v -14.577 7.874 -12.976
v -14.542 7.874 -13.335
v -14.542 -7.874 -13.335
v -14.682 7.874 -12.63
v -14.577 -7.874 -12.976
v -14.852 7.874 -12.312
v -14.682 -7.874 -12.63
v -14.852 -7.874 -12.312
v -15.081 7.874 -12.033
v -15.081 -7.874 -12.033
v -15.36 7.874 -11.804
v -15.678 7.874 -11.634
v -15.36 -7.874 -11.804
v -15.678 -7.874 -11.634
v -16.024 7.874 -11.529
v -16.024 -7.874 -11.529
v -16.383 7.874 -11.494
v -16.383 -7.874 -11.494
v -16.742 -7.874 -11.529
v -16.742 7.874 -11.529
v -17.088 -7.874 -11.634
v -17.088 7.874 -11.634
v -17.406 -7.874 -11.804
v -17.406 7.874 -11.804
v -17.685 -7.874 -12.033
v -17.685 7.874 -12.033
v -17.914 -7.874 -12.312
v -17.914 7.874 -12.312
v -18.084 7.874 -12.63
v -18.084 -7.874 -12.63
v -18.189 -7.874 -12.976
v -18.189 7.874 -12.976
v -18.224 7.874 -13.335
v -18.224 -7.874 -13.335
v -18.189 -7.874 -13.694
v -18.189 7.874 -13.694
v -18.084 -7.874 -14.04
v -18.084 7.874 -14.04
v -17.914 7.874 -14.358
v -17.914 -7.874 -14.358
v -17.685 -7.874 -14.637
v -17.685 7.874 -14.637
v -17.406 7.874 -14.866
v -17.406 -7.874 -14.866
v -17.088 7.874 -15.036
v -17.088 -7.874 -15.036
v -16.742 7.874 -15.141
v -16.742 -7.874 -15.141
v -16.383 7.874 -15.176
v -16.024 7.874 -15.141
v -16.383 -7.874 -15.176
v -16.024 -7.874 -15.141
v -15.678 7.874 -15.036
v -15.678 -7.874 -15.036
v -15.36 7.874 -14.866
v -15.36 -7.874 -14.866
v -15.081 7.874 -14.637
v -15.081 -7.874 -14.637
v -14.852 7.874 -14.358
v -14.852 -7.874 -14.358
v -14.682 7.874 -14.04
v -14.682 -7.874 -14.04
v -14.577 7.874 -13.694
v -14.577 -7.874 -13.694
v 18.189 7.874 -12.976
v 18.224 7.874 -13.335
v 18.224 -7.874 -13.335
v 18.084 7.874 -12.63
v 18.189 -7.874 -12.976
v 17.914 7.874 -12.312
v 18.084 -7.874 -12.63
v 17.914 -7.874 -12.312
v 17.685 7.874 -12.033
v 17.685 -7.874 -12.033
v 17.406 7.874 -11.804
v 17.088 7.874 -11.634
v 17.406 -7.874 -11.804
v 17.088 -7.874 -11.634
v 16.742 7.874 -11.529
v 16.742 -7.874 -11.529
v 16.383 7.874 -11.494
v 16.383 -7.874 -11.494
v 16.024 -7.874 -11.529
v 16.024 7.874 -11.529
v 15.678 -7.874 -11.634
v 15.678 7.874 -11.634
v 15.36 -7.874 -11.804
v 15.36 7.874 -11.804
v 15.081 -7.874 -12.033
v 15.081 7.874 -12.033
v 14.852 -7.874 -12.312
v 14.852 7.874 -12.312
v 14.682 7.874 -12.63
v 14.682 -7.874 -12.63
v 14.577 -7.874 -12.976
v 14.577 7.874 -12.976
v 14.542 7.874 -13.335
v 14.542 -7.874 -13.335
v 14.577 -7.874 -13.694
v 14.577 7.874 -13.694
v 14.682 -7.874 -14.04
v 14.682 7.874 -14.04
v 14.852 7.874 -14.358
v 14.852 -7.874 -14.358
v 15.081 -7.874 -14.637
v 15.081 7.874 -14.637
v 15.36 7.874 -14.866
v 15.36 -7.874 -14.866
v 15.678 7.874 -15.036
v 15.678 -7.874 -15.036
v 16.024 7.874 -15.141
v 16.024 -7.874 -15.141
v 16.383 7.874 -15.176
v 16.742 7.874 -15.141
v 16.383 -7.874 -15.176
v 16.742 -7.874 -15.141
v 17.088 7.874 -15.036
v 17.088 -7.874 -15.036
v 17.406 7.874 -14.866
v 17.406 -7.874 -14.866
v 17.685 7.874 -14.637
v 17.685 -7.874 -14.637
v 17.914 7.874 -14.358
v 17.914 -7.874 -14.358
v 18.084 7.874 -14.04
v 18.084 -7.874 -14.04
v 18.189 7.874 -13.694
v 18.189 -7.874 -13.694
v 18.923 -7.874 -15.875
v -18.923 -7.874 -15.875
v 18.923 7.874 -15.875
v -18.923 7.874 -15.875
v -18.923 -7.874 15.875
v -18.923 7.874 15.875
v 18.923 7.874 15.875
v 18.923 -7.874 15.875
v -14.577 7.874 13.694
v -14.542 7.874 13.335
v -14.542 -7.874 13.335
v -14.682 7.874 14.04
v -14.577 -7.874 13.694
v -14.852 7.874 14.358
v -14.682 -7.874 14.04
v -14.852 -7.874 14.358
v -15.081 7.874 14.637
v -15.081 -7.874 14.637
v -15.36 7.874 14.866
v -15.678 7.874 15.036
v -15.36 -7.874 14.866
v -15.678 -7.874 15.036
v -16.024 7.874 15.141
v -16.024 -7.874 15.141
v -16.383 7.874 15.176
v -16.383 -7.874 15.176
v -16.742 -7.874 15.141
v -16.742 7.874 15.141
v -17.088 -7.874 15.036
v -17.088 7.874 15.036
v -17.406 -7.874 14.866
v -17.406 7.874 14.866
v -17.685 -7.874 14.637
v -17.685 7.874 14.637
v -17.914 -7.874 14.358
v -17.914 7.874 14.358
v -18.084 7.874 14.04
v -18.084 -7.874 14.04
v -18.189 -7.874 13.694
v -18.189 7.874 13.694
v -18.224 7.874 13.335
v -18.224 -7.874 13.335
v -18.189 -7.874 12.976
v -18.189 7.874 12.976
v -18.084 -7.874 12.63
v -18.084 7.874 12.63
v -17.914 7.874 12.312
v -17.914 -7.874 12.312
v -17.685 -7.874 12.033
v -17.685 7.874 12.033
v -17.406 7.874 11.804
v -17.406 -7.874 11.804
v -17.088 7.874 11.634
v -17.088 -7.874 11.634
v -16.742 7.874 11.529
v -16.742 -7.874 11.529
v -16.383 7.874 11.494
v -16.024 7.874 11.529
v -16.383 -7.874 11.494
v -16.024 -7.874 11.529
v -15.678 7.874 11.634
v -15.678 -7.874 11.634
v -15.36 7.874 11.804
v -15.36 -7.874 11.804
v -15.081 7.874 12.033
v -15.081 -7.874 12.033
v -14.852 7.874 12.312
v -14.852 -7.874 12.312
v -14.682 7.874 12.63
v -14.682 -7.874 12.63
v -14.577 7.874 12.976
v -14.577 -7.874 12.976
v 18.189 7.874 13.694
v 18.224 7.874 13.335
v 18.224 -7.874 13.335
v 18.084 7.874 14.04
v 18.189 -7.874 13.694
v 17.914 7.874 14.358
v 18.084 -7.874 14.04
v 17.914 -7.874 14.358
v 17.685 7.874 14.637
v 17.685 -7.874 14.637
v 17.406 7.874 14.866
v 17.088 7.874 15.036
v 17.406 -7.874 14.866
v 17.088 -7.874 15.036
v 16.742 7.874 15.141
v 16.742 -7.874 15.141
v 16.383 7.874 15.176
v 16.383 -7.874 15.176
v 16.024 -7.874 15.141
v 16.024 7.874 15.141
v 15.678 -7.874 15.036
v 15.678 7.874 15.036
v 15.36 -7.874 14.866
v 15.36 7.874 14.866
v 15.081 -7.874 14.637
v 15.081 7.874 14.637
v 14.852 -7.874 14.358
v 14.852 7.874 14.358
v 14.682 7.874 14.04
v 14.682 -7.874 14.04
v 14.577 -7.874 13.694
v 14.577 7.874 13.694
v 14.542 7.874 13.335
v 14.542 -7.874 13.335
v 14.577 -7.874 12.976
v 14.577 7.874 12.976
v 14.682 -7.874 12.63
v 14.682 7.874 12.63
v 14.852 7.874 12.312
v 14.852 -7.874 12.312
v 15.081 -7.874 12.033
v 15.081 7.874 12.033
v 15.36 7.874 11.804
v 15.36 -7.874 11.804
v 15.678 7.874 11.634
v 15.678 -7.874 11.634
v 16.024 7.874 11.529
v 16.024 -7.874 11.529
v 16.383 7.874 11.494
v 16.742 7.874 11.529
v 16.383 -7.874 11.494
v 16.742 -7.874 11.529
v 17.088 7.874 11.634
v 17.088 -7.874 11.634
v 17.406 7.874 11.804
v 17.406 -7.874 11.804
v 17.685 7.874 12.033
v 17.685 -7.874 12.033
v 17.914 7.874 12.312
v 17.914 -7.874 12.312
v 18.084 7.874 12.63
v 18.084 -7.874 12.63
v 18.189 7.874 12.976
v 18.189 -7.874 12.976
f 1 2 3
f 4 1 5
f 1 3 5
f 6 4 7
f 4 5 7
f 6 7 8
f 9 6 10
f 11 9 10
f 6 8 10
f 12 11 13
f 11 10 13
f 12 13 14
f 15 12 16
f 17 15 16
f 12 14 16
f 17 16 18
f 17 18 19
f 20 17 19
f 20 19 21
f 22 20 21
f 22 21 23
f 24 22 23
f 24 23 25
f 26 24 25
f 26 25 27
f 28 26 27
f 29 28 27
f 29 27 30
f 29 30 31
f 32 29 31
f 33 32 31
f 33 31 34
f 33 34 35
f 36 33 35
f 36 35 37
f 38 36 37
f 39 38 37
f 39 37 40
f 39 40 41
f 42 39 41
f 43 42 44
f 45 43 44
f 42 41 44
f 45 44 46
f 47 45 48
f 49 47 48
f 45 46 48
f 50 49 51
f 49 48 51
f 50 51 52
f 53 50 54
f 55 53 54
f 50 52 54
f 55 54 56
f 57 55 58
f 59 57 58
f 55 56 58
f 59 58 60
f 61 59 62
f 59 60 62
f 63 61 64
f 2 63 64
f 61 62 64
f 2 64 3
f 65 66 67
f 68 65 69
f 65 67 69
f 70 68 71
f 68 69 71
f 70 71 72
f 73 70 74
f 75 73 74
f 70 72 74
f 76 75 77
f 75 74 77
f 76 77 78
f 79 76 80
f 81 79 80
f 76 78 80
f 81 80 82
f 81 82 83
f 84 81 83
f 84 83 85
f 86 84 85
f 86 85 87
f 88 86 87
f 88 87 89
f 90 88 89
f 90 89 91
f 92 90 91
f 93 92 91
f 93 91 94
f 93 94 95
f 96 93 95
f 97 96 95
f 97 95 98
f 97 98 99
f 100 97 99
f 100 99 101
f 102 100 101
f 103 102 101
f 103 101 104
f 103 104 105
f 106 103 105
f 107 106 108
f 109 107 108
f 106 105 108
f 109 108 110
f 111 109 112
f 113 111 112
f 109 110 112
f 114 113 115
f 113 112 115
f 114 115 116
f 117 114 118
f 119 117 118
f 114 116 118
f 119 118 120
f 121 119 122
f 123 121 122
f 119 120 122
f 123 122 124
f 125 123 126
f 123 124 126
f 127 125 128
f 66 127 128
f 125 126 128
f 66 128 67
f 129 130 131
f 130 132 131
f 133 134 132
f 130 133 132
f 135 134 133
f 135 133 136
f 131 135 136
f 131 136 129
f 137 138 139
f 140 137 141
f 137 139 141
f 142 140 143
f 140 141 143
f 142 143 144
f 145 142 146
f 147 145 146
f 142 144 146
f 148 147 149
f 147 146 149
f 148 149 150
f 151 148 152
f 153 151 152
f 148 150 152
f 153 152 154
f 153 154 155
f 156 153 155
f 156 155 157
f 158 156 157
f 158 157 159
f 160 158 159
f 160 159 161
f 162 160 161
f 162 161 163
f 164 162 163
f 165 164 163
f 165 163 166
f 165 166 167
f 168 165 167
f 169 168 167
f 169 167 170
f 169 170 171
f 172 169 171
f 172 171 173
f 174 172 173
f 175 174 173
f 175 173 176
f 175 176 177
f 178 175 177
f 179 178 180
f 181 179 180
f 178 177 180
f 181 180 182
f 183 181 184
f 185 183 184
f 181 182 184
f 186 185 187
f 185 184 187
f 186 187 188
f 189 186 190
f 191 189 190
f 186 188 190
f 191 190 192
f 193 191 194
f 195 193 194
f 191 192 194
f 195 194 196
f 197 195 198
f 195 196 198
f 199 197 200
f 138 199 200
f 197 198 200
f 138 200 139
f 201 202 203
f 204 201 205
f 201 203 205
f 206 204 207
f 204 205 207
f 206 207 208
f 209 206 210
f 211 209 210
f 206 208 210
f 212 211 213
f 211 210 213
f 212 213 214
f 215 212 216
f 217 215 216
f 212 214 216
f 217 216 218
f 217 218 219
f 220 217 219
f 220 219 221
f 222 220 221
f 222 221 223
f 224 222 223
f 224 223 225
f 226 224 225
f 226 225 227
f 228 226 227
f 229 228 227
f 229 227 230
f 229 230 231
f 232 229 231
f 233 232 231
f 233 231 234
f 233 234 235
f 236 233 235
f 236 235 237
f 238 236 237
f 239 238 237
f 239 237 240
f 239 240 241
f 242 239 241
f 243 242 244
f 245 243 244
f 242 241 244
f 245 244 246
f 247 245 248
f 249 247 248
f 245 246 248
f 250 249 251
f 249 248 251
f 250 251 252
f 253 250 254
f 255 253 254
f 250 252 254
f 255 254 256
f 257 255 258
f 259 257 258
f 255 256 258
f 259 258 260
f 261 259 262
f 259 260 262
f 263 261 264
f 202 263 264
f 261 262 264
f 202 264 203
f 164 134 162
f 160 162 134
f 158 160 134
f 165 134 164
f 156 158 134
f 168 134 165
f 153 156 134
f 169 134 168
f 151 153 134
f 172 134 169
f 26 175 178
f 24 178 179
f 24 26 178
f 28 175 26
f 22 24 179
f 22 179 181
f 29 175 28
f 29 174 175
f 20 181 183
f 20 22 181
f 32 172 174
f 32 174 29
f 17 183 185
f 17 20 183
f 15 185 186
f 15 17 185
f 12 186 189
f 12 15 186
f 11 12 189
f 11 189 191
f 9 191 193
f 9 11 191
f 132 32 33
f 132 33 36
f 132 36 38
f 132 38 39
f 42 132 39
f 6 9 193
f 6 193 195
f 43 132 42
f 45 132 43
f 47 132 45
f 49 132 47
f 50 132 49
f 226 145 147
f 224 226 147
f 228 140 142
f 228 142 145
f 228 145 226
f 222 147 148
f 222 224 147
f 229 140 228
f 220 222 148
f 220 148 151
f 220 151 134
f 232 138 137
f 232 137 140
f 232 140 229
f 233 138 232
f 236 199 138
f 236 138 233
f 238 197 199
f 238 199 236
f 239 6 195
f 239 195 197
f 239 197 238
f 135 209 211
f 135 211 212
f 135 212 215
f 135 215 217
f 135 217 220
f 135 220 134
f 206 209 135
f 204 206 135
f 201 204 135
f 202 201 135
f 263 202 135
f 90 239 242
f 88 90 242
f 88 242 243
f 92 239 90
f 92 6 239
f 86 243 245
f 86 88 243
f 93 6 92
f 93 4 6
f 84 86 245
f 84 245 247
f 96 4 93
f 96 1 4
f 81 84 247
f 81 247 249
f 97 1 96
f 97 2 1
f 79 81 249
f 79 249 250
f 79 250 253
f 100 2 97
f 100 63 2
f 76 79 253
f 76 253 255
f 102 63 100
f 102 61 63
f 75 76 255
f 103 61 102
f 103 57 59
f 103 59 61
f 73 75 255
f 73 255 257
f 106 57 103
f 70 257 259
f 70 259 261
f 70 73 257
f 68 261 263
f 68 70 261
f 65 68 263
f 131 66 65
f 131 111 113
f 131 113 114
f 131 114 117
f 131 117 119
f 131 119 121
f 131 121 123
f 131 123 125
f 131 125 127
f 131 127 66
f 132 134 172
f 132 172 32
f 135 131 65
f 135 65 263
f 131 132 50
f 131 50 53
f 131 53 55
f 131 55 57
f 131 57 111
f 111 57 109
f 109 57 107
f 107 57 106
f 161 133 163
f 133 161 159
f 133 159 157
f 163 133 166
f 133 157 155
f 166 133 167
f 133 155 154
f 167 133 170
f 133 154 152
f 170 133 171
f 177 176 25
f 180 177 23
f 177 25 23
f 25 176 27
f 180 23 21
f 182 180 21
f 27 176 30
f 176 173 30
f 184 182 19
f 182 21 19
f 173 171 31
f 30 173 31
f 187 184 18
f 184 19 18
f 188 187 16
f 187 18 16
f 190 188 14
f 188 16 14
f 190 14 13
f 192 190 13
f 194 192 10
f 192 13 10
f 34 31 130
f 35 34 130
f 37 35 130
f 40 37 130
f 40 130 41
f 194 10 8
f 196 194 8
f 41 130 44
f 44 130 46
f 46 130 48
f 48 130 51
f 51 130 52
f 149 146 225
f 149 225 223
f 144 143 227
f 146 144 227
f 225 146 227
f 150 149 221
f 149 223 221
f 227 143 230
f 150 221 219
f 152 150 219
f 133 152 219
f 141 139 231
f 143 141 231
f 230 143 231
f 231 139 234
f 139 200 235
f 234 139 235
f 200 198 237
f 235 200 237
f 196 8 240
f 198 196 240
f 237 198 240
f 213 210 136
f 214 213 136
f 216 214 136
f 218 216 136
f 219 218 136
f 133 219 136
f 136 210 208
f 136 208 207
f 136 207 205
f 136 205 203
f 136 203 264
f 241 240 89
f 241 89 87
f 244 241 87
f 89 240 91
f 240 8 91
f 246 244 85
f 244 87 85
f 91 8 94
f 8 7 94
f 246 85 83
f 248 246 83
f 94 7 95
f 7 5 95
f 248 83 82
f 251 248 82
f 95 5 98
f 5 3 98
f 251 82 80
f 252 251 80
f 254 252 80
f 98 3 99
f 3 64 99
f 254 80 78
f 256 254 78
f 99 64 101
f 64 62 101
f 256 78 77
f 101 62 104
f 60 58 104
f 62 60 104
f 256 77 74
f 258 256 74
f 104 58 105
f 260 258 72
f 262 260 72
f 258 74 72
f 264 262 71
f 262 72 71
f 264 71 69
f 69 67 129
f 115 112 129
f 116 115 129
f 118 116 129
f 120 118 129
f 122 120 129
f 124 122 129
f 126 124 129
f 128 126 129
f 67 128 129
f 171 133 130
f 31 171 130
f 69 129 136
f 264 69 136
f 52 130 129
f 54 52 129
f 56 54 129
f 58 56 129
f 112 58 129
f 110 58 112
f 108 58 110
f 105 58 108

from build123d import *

# Parameters (mm, degrees)
SKETCH1_W           = 37.846
SKETCH1_H           = 31.75
BOSS_EXTRUDE1_DEPTH = 7.874
SKETCH2_R           = 1.8415
CUT_EXTRUDE1_DEPTH  = 16.748


with BuildPart() as part:
    # Sketch1 → Boss-Extrude1 (new body, symmetric)
    with BuildSketch(Plane(origin=(0, 0, 0), x_dir=(1, 0, 0), z_dir=(0, 1, 0))):
        Rectangle(SKETCH1_W, SKETCH1_H)
    extrude(amount=BOSS_EXTRUDE1_DEPTH, both=True)

    # Sketch2 → Cut-Extrude1 (cut, through all)
    with BuildSketch(Plane.XZ.offset(7.874)):
        with Locations((-16.383, 13.335)):
            Circle(SKETCH2_R)
        with Locations((16.383, 13.335)):
            Circle(SKETCH2_R)
        with Locations((16.383, -13.335)):
            Circle(SKETCH2_R)
        with Locations((-16.383, -13.335)):
            Circle(SKETCH2_R)
    extrude(amount=-CUT_EXTRUDE1_DEPTH, mode=Mode.SUBTRACT)


solid = part.part
